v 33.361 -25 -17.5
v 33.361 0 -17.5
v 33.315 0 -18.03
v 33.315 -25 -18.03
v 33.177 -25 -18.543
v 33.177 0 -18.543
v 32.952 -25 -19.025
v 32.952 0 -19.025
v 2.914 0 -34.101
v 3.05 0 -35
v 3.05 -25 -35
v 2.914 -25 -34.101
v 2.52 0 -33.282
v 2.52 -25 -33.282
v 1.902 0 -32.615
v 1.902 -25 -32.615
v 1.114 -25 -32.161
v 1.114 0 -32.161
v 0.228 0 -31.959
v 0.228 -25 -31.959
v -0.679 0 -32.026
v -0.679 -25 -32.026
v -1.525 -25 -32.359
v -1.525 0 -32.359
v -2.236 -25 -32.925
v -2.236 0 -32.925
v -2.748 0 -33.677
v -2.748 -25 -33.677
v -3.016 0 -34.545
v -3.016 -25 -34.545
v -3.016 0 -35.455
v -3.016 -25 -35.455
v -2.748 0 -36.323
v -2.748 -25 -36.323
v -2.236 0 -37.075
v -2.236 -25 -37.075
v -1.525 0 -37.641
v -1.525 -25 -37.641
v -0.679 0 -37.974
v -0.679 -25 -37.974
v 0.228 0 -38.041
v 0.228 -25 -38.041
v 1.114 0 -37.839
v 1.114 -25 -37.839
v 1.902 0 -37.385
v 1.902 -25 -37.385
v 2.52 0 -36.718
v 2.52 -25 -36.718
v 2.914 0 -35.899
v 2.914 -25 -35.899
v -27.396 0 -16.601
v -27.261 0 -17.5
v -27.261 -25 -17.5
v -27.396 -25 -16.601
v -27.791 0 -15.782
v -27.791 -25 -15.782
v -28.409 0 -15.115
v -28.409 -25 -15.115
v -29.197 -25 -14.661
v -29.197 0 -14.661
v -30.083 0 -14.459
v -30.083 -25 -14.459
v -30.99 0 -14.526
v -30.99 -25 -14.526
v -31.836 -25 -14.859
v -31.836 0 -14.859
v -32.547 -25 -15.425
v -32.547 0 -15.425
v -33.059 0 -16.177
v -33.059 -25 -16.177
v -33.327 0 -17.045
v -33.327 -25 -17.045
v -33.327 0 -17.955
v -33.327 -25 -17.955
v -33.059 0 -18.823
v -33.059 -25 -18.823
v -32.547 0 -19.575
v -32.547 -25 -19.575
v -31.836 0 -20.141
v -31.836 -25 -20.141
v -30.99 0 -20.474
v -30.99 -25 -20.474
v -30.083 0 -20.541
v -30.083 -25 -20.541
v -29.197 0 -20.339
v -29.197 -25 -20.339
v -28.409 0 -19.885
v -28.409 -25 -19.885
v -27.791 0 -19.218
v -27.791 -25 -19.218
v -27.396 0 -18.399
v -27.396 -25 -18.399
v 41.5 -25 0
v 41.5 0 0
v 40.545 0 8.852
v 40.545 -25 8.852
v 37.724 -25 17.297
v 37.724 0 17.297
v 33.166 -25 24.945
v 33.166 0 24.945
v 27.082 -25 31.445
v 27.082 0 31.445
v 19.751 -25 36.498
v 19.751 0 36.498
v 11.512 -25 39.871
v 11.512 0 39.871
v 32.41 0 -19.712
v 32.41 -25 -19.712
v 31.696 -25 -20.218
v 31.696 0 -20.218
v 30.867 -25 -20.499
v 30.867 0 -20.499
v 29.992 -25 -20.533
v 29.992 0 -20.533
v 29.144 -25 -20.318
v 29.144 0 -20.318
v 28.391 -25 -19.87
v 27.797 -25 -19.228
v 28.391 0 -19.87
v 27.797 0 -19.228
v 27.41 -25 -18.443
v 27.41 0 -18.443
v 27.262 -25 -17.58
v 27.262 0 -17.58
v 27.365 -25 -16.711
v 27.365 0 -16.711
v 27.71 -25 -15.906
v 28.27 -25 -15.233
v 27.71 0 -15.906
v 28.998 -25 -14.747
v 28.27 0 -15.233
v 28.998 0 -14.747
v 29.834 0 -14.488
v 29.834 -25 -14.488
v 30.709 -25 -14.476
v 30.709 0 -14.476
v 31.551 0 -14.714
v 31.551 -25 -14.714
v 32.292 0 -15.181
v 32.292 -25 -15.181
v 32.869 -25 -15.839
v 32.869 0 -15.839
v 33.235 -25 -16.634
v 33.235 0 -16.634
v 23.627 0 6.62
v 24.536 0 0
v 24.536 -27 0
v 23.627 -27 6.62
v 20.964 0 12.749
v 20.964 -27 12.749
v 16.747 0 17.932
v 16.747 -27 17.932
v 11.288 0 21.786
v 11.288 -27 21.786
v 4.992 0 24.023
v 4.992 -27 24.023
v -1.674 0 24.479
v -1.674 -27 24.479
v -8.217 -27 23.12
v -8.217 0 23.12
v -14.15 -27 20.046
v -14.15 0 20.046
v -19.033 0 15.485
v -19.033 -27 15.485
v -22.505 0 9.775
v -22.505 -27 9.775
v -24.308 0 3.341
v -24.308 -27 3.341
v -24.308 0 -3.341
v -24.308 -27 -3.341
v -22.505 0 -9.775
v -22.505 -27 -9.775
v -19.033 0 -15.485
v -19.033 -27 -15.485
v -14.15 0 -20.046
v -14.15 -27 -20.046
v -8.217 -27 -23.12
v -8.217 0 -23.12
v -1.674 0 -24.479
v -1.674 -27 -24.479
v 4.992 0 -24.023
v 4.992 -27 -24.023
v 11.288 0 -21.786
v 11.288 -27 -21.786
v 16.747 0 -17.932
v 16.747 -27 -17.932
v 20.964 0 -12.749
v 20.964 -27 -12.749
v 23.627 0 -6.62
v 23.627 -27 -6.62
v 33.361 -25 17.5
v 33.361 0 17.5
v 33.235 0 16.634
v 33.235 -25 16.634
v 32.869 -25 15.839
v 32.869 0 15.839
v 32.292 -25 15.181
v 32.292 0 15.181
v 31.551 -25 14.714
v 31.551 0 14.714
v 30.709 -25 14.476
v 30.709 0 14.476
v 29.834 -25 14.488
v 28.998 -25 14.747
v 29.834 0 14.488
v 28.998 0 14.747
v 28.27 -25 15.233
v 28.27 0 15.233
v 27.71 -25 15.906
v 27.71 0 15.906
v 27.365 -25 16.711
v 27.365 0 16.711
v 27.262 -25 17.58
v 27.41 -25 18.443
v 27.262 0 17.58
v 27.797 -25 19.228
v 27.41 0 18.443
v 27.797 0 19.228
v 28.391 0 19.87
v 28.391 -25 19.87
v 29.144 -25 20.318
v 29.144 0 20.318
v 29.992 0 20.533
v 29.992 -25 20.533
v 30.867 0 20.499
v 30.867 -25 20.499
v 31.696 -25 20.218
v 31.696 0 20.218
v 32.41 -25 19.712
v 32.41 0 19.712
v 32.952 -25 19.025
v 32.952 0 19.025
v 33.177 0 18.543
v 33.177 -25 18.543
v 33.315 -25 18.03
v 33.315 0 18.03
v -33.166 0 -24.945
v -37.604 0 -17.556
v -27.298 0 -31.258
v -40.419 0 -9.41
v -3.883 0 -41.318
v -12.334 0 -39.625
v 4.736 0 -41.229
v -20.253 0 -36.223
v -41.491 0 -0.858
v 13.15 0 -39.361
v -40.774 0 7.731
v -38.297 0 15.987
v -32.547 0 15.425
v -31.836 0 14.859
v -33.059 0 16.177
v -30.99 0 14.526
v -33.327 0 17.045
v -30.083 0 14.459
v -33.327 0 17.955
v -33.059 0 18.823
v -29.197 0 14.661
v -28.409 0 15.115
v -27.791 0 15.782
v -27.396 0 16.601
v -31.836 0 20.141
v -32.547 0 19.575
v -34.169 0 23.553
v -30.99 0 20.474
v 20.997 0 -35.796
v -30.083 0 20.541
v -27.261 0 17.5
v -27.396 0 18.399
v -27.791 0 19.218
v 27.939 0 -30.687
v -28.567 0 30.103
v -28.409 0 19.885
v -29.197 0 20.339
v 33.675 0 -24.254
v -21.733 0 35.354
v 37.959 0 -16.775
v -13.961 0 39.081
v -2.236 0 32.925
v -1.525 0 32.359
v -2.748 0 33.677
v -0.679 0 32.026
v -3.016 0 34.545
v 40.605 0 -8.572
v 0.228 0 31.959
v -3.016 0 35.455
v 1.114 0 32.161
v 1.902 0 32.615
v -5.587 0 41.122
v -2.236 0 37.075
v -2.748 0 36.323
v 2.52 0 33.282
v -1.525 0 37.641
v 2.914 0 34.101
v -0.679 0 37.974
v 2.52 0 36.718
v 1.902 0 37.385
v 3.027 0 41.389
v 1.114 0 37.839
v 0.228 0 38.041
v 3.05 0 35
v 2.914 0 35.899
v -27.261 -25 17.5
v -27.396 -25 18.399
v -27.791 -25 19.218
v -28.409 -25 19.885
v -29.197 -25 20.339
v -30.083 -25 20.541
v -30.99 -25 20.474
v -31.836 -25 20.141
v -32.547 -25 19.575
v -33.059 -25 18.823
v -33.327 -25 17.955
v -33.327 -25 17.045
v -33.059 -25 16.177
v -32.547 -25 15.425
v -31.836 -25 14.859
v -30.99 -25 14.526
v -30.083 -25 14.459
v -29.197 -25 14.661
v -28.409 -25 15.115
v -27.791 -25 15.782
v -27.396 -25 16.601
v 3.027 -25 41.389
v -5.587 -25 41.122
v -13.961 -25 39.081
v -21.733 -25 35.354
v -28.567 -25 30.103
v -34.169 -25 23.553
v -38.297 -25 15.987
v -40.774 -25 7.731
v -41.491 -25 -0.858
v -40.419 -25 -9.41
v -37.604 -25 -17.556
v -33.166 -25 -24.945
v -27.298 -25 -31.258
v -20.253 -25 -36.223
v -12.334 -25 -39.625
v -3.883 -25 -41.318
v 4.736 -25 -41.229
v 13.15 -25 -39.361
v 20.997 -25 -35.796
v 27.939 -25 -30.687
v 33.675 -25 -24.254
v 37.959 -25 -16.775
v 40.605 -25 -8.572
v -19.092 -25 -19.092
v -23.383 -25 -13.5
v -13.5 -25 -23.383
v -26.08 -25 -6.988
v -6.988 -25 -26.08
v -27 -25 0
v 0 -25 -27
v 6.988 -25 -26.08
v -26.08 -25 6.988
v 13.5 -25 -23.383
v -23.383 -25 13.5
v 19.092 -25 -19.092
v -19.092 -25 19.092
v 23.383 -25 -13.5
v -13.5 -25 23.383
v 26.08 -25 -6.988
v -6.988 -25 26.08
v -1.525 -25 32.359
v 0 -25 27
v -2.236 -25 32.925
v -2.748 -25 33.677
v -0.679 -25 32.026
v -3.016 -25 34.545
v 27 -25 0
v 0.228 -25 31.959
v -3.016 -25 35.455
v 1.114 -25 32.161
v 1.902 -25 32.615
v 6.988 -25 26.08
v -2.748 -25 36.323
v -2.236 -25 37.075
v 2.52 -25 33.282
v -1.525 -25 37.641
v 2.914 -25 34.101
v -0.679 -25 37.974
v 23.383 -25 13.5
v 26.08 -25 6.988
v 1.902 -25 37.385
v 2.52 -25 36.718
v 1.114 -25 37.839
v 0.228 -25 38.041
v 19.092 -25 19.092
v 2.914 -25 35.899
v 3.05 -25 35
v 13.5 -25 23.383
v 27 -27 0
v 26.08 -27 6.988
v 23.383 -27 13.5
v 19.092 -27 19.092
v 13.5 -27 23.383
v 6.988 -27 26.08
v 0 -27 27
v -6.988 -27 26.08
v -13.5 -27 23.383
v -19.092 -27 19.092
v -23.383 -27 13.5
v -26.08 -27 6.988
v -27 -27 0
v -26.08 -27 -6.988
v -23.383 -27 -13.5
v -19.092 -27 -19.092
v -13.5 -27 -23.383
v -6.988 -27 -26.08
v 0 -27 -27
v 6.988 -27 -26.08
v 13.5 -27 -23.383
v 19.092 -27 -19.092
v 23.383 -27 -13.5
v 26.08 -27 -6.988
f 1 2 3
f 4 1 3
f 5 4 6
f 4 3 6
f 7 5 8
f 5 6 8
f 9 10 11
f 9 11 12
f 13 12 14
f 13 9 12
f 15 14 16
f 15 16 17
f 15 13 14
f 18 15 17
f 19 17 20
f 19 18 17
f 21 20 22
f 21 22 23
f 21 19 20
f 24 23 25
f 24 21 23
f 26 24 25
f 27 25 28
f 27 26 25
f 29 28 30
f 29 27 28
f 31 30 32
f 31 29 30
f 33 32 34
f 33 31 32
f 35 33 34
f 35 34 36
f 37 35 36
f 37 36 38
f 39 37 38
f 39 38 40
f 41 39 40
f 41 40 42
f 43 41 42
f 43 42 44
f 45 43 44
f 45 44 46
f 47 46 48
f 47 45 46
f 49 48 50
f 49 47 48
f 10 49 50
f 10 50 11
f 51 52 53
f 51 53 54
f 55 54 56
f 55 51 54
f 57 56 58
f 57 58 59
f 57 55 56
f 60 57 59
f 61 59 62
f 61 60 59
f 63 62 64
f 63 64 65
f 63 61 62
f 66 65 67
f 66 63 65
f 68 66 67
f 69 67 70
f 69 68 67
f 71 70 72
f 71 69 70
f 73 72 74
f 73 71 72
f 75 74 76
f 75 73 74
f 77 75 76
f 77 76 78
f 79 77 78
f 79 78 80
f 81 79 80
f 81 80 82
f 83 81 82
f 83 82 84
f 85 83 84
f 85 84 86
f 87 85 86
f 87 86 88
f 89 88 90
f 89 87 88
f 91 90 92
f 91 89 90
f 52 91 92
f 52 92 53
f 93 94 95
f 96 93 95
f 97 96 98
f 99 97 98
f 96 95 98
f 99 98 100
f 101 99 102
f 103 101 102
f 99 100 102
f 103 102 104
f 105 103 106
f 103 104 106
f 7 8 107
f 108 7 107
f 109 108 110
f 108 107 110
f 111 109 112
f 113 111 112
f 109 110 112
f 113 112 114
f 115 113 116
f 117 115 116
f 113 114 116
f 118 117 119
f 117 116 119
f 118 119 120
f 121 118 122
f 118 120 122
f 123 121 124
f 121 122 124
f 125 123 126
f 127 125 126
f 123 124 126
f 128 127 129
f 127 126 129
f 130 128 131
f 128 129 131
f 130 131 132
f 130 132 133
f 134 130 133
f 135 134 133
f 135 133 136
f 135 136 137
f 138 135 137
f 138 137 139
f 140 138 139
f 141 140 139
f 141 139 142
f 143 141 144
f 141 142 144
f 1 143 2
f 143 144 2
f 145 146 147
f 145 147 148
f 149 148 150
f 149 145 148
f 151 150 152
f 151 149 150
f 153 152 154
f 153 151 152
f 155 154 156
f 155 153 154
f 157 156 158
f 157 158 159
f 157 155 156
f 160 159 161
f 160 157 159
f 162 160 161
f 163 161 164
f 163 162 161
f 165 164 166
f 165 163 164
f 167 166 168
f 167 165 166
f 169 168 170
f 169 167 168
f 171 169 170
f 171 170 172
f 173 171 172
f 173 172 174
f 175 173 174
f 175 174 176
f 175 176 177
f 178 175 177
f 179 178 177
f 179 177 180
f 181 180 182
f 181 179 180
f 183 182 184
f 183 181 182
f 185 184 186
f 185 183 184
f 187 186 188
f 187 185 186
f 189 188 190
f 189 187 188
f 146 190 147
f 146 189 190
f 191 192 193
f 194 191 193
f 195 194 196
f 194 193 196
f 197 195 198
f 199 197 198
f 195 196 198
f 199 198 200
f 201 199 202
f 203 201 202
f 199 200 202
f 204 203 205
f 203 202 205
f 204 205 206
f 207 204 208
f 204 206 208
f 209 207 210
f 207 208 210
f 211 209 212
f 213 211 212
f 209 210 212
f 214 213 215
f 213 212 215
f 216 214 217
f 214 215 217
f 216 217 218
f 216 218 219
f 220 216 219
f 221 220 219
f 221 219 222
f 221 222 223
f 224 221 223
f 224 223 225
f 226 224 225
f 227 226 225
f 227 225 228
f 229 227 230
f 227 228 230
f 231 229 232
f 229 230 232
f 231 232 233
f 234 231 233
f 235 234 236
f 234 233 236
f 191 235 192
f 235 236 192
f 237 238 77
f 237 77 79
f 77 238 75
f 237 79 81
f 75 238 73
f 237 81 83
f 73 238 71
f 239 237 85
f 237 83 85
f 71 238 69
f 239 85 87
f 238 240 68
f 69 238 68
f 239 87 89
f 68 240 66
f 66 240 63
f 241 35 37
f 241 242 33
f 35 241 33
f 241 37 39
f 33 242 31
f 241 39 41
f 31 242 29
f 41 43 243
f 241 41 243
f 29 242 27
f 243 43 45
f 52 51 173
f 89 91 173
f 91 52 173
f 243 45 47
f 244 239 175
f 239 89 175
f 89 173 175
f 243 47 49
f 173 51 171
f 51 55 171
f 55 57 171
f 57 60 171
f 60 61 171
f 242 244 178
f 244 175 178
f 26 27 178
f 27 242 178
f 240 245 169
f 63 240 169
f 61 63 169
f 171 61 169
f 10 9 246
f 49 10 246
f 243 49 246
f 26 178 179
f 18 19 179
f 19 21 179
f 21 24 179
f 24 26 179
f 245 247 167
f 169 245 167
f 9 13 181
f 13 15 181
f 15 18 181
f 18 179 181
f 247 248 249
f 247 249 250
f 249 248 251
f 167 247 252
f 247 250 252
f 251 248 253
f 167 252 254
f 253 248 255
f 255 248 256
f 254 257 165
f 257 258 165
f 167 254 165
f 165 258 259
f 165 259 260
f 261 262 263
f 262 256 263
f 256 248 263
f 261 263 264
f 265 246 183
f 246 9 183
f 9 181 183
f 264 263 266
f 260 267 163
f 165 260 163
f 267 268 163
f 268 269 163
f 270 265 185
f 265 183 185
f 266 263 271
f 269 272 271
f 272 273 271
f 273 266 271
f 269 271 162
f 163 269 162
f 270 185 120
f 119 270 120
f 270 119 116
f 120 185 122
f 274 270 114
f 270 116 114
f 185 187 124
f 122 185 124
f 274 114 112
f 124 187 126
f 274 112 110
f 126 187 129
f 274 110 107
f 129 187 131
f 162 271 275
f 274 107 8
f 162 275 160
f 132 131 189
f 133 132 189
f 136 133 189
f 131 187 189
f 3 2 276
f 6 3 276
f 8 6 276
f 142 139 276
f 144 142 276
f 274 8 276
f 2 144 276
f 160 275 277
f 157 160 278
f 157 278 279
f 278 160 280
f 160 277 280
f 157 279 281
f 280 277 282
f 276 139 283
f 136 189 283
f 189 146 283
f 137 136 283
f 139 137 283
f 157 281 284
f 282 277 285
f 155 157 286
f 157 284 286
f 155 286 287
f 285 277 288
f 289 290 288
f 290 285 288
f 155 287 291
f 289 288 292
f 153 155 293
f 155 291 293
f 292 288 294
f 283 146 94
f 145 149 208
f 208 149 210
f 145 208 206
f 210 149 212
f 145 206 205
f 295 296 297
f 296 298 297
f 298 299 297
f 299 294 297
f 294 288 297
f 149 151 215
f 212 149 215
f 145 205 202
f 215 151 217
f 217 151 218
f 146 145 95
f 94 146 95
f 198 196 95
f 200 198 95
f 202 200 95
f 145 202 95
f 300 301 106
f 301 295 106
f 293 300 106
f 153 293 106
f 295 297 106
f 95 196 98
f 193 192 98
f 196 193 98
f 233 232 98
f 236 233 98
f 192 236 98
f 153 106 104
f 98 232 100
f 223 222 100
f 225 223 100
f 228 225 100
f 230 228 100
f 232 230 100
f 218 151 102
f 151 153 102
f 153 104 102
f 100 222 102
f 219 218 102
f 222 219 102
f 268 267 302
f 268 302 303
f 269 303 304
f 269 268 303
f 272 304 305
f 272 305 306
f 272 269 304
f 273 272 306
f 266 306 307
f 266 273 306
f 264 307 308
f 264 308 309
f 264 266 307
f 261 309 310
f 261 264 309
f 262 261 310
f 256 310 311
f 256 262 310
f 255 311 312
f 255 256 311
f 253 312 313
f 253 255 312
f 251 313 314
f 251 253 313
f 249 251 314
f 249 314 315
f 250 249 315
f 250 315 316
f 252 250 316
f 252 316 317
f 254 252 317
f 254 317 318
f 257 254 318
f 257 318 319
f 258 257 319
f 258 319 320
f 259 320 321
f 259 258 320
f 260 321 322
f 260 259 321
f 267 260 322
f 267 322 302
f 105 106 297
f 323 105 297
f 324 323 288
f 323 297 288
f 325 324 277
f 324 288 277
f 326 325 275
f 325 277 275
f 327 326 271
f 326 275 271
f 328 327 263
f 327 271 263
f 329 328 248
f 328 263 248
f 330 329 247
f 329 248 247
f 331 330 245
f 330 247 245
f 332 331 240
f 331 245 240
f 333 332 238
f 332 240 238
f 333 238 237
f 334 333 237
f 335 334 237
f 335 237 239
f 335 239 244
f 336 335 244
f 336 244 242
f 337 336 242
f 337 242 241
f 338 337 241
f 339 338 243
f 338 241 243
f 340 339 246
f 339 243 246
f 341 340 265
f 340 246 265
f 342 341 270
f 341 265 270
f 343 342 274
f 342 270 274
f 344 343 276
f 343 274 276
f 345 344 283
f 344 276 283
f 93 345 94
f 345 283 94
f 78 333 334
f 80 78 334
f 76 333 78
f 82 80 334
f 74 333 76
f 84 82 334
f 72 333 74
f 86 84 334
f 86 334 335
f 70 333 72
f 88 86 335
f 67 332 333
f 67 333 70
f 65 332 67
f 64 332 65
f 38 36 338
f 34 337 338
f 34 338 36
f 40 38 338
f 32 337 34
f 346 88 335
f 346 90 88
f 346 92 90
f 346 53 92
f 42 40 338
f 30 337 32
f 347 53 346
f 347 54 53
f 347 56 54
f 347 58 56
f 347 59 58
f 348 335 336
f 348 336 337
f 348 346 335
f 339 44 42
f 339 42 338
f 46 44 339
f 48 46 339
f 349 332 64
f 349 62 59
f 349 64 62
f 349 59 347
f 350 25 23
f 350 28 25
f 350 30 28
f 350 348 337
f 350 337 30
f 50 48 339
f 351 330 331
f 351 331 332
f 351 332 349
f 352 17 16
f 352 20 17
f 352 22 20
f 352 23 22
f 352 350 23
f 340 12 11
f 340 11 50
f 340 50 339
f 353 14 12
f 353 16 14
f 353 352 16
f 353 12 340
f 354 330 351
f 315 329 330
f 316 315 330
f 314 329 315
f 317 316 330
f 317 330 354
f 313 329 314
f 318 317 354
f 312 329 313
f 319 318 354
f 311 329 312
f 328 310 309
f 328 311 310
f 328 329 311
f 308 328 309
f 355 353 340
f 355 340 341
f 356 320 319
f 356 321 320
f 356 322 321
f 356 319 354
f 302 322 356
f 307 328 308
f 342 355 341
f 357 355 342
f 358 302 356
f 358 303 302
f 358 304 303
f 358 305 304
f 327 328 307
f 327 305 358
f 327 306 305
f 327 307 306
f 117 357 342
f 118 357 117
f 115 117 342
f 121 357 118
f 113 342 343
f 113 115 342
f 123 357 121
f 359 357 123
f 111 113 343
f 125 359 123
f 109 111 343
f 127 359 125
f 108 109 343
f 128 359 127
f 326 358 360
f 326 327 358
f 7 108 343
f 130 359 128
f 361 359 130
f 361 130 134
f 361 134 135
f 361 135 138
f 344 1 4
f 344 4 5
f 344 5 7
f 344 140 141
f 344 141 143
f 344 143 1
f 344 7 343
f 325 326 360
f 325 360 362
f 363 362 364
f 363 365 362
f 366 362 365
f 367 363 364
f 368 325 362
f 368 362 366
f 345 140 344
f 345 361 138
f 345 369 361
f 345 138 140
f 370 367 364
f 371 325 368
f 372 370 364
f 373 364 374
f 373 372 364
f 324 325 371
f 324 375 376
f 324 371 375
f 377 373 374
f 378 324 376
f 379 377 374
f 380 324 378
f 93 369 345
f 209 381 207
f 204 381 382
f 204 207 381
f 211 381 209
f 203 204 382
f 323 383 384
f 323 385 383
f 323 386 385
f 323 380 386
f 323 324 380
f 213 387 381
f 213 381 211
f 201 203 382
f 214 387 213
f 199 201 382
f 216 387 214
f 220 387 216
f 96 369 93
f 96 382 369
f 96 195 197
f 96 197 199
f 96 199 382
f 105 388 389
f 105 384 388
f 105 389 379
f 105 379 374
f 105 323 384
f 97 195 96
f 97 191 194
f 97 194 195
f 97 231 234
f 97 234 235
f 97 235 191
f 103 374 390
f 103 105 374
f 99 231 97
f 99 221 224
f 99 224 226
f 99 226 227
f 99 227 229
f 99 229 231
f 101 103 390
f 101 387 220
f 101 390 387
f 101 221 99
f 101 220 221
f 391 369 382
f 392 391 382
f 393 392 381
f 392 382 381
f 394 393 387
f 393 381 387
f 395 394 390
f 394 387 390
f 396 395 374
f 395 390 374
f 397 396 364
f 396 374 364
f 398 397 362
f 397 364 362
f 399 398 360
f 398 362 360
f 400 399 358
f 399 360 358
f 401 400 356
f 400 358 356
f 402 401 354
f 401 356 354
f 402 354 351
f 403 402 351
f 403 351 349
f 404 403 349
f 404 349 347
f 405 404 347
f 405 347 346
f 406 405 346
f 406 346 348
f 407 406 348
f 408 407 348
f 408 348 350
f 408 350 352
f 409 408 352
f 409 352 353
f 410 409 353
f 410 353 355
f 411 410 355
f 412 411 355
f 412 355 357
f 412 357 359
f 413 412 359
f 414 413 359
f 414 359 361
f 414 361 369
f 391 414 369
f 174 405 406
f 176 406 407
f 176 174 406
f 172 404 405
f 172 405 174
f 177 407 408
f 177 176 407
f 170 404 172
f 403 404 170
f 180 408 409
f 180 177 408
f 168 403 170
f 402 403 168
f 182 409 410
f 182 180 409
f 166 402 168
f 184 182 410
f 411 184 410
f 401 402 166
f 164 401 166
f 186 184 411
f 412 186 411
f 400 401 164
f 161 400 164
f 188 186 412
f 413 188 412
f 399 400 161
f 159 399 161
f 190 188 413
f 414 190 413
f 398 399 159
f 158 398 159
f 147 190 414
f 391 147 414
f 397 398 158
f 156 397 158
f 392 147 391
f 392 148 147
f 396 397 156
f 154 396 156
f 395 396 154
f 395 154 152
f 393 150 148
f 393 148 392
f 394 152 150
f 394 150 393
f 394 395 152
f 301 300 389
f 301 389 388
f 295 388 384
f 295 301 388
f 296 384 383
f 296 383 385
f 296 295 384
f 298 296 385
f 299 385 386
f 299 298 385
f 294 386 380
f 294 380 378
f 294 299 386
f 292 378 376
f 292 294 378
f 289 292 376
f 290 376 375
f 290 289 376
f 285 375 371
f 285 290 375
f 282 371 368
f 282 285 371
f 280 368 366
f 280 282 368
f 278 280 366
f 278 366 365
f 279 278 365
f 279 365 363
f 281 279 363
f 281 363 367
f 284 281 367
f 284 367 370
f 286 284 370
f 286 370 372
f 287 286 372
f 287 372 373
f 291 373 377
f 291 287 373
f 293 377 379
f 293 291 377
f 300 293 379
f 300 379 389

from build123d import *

# Parameters (mm, degrees)
F0_R     = 3.05
F0_R_2   = 27
F1_DEPTH = 25
F3_DEPTH = 27
F4_R     = 24.536421
F5_DEPTH = 27


with BuildPart() as f1:
    # F0 (on Front) → F1 (new body)
    with BuildSketch(Plane.XZ):
        with BuildLine():
            ThreePointArc((11.511698, 39.871429), (-33.166138, -24.945085), (41.5, 0))
            ThreePointArc((41.5, 0), (33.166138, 24.945085), (11.511698, 39.871429))
        make_face()
        with Locations((-30.310889, -17.5)):
            Circle(F0_R, mode=Mode.SUBTRACT)
        with Locations((0, -35)):
            Circle(F0_R, mode=Mode.SUBTRACT)
        with BuildLine():
            ThreePointArc((32.952267, -19.025), (27.364815, -16.710602), (33.360889, -17.5))
            ThreePointArc((33.360889, -17.5), (33.256963, -18.289398), (32.952267, -19.025))
        make_face(mode=Mode.SUBTRACT)
        with Locations((-30.310889, 17.5)):
            Circle(F0_R, mode=Mode.SUBTRACT)
        Circle(F0_R_2, mode=Mode.SUBTRACT)
        with BuildLine():
            ThreePointArc((32.952267, 19.025), (33.256963, 18.289398), (33.360889, 17.5))
            ThreePointArc((33.360889, 17.5), (27.364815, 16.710602), (32.952267, 19.025))
        make_face(mode=Mode.SUBTRACT)
        with Locations((0, 35)):
            Circle(F0_R, mode=Mode.SUBTRACT)
    extrude(amount=F1_DEPTH)

    # F0 (on Front) → F3 (join)
    with BuildSketch(Plane.XZ):
        Circle(F0_R_2)
    extrude(amount=F3_DEPTH)

    # F4 (on Front) → F5 (cut)
    with BuildSketch(Plane.XZ):
        Circle(F4_R)
    extrude(amount=F5_DEPTH, mode=Mode.SUBTRACT)


solid = f1.part
